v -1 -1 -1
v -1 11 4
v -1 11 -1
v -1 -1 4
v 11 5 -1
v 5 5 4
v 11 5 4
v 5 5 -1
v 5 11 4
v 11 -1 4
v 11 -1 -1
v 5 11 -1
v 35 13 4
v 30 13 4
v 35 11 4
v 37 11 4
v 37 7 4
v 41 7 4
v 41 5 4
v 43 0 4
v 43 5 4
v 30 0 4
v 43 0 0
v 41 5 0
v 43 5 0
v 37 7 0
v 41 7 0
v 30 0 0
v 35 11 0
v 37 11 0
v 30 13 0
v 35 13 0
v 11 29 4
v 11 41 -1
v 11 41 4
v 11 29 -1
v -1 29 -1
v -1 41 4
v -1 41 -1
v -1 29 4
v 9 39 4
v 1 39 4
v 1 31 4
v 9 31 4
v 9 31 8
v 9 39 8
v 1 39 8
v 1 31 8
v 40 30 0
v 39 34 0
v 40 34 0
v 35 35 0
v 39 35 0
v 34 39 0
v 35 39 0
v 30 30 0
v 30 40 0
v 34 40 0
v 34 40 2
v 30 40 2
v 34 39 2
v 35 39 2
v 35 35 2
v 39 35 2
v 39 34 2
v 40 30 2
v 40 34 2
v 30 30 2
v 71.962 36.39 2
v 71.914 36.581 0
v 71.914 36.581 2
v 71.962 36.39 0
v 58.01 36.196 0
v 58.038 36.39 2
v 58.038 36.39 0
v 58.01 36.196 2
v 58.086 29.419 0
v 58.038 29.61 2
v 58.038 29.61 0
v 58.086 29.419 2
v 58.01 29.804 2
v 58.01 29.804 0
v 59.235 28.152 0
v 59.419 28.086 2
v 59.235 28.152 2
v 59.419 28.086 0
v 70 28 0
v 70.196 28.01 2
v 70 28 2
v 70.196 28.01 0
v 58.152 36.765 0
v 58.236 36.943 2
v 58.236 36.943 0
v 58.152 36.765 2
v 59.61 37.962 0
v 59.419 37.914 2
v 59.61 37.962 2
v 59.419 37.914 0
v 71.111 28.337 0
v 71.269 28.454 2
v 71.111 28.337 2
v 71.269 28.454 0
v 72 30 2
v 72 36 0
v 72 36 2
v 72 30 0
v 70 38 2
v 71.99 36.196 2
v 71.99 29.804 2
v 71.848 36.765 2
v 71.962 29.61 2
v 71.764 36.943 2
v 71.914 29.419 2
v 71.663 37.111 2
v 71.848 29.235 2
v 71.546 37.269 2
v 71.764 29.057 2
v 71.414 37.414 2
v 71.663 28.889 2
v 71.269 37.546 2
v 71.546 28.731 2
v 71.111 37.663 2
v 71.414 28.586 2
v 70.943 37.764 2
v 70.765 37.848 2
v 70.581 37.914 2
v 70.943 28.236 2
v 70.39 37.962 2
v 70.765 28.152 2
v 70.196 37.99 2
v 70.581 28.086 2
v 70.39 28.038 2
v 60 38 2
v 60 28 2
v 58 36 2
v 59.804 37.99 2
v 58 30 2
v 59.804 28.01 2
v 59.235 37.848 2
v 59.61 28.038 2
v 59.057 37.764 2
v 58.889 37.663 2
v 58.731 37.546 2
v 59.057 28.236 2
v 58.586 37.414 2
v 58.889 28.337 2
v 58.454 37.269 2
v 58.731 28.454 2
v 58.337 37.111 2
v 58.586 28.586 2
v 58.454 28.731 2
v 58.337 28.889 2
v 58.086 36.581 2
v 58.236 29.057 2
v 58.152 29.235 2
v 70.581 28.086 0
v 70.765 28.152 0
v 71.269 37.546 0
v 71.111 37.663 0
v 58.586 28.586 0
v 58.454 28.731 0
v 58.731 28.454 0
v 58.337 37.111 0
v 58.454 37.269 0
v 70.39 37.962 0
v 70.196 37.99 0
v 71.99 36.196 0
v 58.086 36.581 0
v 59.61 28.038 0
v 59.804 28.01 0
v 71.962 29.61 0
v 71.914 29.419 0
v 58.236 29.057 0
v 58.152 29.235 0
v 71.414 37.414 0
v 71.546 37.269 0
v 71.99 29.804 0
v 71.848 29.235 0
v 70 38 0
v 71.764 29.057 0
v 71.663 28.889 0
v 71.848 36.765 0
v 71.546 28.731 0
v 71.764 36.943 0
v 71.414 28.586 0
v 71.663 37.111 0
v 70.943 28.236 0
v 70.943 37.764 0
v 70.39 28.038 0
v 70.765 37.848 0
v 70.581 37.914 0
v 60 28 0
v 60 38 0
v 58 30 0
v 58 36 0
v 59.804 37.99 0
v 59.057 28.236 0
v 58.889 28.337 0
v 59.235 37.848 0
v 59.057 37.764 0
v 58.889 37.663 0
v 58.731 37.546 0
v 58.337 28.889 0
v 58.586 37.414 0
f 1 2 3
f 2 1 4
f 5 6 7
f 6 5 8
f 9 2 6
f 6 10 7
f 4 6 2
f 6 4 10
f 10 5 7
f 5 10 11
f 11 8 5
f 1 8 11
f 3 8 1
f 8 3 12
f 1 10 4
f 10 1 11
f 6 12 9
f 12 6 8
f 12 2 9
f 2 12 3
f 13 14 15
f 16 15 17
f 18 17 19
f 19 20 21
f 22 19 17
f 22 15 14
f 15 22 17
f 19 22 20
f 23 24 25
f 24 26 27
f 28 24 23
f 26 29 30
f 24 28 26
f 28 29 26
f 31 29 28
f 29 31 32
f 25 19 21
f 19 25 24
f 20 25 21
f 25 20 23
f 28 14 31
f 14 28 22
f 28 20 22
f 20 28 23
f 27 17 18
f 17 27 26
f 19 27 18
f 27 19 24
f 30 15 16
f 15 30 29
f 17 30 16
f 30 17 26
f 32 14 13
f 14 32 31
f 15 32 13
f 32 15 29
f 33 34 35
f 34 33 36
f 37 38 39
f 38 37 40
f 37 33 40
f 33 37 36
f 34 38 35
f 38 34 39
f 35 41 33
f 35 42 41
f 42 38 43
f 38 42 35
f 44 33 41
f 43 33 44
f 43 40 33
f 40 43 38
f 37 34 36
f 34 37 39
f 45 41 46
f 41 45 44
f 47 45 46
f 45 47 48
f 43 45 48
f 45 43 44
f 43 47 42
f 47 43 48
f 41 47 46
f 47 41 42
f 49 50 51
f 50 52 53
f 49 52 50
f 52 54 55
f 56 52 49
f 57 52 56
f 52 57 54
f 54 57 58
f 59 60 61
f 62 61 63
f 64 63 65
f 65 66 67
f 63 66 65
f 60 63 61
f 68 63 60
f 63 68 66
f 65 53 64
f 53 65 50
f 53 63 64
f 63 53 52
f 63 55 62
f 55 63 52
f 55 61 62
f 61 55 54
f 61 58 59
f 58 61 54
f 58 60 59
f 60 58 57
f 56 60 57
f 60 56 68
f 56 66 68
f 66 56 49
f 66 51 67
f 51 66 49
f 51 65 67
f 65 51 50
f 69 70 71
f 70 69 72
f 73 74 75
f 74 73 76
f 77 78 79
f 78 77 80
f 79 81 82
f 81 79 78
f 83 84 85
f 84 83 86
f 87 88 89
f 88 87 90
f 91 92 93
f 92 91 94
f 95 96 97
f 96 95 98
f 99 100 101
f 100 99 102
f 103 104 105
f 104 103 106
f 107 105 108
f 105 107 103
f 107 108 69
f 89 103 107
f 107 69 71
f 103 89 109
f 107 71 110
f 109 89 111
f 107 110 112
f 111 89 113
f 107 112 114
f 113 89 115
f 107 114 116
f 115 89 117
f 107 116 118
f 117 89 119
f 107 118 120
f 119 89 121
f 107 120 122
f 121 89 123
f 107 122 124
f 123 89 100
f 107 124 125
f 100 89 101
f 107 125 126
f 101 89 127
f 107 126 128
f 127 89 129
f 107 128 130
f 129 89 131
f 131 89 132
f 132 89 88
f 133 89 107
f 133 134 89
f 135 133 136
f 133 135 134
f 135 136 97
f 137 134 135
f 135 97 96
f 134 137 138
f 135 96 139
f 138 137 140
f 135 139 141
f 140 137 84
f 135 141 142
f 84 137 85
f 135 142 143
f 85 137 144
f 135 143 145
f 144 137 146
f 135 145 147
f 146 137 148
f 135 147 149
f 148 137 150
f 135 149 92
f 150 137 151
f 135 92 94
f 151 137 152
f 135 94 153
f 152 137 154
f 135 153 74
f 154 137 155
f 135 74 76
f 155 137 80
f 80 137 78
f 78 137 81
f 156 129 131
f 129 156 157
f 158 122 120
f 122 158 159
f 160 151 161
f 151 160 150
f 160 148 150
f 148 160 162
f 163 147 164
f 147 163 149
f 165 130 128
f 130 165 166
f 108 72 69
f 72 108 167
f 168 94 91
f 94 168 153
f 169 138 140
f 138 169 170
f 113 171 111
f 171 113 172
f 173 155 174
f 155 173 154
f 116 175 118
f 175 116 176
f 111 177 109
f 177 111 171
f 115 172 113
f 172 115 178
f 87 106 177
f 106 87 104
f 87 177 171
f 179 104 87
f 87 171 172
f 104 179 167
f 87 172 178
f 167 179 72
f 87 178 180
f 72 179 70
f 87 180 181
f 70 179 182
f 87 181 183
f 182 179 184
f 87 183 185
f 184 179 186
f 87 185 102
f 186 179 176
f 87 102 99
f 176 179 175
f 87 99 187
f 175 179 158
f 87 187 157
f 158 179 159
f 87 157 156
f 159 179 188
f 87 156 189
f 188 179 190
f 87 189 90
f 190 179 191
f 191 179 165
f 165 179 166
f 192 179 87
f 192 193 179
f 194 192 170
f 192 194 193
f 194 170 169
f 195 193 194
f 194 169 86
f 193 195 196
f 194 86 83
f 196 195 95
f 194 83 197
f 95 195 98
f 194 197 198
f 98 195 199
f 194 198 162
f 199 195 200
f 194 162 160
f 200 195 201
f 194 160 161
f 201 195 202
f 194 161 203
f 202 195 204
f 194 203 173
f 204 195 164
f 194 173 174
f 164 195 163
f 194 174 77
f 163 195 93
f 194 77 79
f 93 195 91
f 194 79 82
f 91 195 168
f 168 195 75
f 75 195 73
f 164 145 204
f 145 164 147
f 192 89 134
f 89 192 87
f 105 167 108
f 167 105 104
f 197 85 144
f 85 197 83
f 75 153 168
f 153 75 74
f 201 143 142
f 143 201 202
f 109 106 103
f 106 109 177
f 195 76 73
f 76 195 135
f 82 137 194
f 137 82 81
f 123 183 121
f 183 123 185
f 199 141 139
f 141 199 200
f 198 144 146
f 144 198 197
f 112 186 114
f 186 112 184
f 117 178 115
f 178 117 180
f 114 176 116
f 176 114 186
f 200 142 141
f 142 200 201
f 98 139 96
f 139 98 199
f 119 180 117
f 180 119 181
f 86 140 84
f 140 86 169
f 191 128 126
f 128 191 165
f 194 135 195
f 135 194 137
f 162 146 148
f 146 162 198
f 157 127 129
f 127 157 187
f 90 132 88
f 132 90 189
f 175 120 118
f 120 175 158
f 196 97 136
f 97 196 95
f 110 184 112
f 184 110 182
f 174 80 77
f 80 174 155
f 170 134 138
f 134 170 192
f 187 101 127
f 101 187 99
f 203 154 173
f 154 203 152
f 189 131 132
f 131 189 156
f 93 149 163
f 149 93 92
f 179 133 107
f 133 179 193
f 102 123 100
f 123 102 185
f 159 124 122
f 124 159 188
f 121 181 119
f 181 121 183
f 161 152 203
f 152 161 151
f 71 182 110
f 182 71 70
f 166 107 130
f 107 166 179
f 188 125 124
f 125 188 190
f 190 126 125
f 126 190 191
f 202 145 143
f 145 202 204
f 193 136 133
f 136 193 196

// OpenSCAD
// minkowski beyond "a convex second child"
// a) the convex child written FIRST: the sum is commutative, the convex one is the kernel
minkowski() { cube(2, center = true); linear_extrude(3) polygon([[0, 0], [10, 0], [10, 4], [4, 4], [4, 10], [0, 10]]); }
// b) both non-convex, both upright extrusions: an L plus a small L
translate([30, 0, 0]) minkowski() {
    linear_extrude(3) polygon([[0, 0], [10, 0], [10, 4], [4, 4], [4, 10], [0, 10]]);
    linear_extrude(1) polygon([[0, 0], [3, 0], [3, 1], [1, 1], [1, 3], [0, 3]]);
}
// c) a stacked base (two cubes, different footprints) with a cube kernel
translate([0, 30, 0]) minkowski() { union() { cube([10, 10, 3]); translate([2, 2, 3]) cube([6, 6, 4]); } cube(2, center = true); }
// d) 2D, both non-convex
translate([30, 30, 0]) linear_extrude(2) minkowski() {
    polygon([[0, 0], [8, 0], [8, 3], [3, 3], [3, 8], [0, 8]]);
    polygon([[0, 0], [2, 0], [2, 1], [1, 1], [1, 2], [0, 2]]);
}
// e) 2D, the circle written first
translate([60, 30, 0]) linear_extrude(2) minkowski() { circle(r = 2, $fn = 64); square([10, 6]); }
